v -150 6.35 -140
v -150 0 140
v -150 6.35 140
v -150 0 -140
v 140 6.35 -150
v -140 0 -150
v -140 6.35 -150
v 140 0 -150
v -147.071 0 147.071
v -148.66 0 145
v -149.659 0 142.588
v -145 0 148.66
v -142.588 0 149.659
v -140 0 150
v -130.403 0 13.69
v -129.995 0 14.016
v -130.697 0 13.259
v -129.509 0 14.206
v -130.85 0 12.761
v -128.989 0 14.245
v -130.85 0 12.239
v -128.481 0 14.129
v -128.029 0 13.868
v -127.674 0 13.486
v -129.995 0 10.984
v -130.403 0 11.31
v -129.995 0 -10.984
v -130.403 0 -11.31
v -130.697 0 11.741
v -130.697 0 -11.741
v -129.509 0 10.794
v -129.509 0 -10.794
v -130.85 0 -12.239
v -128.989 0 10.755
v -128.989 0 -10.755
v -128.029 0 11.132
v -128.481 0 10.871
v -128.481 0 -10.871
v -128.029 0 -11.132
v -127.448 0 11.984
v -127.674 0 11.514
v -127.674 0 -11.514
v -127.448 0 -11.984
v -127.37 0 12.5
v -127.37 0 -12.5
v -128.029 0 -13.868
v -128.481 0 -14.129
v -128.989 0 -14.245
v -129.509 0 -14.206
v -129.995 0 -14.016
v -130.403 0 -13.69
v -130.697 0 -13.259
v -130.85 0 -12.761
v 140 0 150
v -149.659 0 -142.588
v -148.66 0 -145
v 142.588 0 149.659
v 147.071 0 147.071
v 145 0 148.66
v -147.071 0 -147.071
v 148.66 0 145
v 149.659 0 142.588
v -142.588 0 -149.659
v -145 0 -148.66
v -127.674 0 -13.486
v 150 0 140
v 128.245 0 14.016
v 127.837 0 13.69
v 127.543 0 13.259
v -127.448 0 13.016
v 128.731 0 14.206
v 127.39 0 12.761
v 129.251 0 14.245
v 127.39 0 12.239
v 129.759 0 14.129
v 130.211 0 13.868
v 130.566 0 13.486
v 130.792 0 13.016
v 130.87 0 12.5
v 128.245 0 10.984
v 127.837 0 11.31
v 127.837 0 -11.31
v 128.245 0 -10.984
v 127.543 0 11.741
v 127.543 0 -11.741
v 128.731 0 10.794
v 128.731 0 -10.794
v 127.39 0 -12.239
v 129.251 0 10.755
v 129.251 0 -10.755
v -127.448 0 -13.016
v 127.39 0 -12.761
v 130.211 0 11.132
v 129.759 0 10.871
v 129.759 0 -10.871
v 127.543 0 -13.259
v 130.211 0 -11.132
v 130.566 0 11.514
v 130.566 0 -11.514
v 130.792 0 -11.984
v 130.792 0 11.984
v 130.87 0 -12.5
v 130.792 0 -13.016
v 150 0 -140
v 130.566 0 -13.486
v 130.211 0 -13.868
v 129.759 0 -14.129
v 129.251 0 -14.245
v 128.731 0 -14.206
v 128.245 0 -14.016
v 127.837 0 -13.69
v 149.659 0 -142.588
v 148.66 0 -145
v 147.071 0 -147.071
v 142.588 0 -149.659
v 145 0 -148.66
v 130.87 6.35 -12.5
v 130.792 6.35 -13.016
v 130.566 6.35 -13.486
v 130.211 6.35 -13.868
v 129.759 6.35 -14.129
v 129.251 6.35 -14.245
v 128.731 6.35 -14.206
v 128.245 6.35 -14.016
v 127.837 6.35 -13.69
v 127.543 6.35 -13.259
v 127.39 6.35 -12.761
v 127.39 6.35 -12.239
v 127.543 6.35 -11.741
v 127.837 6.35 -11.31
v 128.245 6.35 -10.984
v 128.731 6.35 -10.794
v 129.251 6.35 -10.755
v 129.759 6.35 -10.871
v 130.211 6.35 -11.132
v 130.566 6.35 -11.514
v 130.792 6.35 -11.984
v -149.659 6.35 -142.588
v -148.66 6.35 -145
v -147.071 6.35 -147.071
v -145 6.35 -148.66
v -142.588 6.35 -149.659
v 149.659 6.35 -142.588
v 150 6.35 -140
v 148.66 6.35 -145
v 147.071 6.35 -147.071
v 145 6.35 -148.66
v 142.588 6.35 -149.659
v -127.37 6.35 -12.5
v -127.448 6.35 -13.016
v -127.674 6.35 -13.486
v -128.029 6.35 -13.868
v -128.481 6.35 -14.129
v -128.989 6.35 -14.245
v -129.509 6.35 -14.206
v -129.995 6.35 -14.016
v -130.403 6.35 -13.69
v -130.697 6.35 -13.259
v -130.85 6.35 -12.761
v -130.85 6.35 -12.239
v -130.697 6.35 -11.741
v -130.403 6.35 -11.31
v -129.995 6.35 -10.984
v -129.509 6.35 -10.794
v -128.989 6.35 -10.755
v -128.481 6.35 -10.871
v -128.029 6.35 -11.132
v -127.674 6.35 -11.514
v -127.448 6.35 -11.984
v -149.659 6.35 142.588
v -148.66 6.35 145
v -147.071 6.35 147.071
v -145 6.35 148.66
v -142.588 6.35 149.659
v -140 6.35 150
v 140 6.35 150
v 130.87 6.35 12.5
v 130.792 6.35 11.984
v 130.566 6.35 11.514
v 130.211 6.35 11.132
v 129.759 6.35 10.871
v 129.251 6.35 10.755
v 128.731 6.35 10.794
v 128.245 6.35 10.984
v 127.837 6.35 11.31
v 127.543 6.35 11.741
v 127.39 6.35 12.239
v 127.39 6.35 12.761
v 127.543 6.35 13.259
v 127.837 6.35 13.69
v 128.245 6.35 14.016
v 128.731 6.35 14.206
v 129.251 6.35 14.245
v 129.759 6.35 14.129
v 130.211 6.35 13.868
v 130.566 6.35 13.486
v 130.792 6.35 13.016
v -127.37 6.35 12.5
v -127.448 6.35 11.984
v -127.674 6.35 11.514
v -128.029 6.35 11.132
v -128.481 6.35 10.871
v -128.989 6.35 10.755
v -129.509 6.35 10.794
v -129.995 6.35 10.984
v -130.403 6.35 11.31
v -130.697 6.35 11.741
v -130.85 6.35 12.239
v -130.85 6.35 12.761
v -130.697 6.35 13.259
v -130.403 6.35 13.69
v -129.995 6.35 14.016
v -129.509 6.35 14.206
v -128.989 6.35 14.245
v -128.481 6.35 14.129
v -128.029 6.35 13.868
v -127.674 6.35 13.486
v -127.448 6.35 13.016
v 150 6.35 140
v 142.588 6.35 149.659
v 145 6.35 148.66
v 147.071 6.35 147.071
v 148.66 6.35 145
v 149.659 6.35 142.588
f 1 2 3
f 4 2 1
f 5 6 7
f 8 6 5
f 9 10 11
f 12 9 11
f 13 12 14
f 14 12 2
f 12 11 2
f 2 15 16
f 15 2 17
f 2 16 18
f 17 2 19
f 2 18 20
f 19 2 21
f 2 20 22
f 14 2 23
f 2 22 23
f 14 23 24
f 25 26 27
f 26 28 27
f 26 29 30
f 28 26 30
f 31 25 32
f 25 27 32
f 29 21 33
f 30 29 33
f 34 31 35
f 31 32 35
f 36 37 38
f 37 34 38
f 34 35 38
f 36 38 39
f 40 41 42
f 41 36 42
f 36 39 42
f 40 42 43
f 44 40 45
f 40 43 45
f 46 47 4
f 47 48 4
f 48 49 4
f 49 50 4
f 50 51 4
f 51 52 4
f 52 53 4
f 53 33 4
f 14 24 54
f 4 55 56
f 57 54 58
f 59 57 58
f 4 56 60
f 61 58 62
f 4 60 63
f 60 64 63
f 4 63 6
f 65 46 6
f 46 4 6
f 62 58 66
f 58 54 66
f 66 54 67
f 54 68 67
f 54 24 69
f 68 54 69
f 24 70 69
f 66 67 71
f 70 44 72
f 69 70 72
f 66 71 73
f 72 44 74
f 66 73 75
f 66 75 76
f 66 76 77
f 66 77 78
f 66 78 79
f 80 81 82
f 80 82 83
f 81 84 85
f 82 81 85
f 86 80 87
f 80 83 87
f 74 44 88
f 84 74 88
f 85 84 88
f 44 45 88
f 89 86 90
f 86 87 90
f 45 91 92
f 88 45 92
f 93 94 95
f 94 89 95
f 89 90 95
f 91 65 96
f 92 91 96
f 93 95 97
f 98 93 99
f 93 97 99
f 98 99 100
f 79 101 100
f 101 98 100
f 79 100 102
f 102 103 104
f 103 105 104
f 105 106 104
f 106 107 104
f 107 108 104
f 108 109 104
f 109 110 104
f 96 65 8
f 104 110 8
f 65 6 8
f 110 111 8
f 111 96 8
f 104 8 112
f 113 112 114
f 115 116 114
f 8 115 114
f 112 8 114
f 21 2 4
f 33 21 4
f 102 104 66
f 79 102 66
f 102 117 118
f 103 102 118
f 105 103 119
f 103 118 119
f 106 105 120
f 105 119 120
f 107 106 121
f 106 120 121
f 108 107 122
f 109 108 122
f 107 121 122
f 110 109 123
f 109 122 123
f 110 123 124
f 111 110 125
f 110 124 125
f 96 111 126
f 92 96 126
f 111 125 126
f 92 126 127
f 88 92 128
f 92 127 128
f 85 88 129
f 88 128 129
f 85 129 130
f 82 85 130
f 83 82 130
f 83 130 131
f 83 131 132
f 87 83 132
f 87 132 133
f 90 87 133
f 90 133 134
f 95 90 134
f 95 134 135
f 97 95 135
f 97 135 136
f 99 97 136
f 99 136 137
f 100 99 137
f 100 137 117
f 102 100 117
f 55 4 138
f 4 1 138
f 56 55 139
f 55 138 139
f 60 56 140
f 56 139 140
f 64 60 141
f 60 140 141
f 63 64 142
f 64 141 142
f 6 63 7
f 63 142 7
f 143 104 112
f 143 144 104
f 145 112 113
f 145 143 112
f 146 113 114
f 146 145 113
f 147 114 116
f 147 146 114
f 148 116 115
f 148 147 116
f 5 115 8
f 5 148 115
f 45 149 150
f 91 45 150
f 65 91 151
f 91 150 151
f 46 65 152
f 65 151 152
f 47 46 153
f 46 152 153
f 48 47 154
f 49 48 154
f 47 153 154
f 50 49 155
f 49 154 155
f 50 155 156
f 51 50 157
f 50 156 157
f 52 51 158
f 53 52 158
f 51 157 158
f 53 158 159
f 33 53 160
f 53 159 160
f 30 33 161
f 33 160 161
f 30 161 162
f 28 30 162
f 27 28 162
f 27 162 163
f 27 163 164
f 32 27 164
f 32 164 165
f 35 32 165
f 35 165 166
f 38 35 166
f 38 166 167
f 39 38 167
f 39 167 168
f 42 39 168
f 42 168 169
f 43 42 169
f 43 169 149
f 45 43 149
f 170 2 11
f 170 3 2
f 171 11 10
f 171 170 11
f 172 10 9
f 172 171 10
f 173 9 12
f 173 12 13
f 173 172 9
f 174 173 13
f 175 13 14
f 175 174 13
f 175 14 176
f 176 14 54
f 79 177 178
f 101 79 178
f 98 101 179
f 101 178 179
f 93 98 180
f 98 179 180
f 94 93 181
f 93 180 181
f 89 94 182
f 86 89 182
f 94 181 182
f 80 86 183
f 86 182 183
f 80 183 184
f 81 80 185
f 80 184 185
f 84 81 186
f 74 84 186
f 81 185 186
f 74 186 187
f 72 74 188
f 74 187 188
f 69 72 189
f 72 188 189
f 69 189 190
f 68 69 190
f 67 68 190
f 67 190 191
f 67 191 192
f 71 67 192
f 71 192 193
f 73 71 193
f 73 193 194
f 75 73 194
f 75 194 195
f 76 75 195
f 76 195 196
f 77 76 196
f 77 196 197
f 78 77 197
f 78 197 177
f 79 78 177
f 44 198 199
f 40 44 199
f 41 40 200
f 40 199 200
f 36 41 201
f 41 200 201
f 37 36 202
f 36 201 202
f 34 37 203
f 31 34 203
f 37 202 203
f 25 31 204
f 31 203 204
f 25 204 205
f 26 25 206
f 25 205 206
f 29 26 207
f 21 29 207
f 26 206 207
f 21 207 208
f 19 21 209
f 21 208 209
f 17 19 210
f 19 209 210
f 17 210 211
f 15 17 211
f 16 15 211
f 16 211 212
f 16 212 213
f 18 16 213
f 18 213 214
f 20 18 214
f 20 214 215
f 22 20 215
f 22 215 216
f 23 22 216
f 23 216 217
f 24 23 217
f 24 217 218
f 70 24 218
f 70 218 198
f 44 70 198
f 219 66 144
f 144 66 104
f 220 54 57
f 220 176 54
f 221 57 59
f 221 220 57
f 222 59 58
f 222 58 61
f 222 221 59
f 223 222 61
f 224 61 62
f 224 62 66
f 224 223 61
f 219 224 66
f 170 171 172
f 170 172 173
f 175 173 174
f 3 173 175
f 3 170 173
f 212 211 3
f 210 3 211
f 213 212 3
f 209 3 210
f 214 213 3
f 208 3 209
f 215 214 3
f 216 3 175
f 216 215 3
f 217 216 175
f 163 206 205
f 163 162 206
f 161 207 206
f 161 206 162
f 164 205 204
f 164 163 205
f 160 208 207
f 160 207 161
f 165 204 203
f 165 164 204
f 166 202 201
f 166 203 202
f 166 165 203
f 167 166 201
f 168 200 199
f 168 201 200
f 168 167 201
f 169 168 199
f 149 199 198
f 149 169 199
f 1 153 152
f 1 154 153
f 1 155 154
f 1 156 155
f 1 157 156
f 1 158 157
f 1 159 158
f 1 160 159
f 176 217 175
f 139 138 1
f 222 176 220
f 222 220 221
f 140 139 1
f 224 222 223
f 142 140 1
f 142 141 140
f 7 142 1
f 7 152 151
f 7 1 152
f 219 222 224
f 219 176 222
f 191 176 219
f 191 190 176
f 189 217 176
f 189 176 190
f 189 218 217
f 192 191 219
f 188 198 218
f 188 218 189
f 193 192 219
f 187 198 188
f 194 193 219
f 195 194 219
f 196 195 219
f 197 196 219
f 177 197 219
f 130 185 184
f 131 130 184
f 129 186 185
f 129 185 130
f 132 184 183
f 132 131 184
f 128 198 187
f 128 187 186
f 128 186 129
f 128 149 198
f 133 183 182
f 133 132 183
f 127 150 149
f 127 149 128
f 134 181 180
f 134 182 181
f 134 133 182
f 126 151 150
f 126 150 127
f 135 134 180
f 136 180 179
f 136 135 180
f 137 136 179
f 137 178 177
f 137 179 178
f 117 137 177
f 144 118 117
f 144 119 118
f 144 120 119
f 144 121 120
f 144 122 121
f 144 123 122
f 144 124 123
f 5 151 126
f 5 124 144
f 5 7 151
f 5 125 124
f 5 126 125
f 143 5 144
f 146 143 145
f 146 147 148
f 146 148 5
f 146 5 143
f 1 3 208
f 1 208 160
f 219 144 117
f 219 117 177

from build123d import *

# Parameters (mm, degrees)
SKETCH1_W           = 300
SKETCH1_H           = 300
BOSS_EXTRUDE1_DEPTH = 6.35
FILLET1_R           = 10
SKETCH2_R           = 1.75
CUT_EXTRUDE1_DEPTH  = 7.35


with BuildPart() as part:
    # Sketch1 → Boss-Extrude1 (new body)
    with BuildSketch(Plane(origin=(0, 0, 0), x_dir=(1, 0, 0), z_dir=(0, 1, 0))):
        Rectangle(SKETCH1_W, SKETCH1_H)
    extrude(amount=BOSS_EXTRUDE1_DEPTH)

    # Fillet1
    fillet1_edges = [part.edges().sort_by_distance(p)[0] for p in [
        (150, 3.175, 150),
        (-150, 3.175, 150),
        (-150, 3.175, -150),
        (150, 3.175, -150),
    ]]
    fillet(fillet1_edges, radius=FILLET1_R)

    # Sketch2 → Cut-Extrude1 (cut, through all)
    with BuildSketch(Plane(origin=(0, 6.35, 0), x_dir=(1, 0, 0), z_dir=(0, 1, 0))):
        with Locations((-129.12, 12.5)):
            Circle(SKETCH2_R)
        with Locations((-129.12, -12.5)):
            Circle(SKETCH2_R)
        with Locations((129.12, 12.5)):
            Circle(SKETCH2_R)
        with Locations((129.12, -12.5)):
            Circle(SKETCH2_R)
    extrude(amount=-CUT_EXTRUDE1_DEPTH, mode=Mode.SUBTRACT)


solid = part.part
